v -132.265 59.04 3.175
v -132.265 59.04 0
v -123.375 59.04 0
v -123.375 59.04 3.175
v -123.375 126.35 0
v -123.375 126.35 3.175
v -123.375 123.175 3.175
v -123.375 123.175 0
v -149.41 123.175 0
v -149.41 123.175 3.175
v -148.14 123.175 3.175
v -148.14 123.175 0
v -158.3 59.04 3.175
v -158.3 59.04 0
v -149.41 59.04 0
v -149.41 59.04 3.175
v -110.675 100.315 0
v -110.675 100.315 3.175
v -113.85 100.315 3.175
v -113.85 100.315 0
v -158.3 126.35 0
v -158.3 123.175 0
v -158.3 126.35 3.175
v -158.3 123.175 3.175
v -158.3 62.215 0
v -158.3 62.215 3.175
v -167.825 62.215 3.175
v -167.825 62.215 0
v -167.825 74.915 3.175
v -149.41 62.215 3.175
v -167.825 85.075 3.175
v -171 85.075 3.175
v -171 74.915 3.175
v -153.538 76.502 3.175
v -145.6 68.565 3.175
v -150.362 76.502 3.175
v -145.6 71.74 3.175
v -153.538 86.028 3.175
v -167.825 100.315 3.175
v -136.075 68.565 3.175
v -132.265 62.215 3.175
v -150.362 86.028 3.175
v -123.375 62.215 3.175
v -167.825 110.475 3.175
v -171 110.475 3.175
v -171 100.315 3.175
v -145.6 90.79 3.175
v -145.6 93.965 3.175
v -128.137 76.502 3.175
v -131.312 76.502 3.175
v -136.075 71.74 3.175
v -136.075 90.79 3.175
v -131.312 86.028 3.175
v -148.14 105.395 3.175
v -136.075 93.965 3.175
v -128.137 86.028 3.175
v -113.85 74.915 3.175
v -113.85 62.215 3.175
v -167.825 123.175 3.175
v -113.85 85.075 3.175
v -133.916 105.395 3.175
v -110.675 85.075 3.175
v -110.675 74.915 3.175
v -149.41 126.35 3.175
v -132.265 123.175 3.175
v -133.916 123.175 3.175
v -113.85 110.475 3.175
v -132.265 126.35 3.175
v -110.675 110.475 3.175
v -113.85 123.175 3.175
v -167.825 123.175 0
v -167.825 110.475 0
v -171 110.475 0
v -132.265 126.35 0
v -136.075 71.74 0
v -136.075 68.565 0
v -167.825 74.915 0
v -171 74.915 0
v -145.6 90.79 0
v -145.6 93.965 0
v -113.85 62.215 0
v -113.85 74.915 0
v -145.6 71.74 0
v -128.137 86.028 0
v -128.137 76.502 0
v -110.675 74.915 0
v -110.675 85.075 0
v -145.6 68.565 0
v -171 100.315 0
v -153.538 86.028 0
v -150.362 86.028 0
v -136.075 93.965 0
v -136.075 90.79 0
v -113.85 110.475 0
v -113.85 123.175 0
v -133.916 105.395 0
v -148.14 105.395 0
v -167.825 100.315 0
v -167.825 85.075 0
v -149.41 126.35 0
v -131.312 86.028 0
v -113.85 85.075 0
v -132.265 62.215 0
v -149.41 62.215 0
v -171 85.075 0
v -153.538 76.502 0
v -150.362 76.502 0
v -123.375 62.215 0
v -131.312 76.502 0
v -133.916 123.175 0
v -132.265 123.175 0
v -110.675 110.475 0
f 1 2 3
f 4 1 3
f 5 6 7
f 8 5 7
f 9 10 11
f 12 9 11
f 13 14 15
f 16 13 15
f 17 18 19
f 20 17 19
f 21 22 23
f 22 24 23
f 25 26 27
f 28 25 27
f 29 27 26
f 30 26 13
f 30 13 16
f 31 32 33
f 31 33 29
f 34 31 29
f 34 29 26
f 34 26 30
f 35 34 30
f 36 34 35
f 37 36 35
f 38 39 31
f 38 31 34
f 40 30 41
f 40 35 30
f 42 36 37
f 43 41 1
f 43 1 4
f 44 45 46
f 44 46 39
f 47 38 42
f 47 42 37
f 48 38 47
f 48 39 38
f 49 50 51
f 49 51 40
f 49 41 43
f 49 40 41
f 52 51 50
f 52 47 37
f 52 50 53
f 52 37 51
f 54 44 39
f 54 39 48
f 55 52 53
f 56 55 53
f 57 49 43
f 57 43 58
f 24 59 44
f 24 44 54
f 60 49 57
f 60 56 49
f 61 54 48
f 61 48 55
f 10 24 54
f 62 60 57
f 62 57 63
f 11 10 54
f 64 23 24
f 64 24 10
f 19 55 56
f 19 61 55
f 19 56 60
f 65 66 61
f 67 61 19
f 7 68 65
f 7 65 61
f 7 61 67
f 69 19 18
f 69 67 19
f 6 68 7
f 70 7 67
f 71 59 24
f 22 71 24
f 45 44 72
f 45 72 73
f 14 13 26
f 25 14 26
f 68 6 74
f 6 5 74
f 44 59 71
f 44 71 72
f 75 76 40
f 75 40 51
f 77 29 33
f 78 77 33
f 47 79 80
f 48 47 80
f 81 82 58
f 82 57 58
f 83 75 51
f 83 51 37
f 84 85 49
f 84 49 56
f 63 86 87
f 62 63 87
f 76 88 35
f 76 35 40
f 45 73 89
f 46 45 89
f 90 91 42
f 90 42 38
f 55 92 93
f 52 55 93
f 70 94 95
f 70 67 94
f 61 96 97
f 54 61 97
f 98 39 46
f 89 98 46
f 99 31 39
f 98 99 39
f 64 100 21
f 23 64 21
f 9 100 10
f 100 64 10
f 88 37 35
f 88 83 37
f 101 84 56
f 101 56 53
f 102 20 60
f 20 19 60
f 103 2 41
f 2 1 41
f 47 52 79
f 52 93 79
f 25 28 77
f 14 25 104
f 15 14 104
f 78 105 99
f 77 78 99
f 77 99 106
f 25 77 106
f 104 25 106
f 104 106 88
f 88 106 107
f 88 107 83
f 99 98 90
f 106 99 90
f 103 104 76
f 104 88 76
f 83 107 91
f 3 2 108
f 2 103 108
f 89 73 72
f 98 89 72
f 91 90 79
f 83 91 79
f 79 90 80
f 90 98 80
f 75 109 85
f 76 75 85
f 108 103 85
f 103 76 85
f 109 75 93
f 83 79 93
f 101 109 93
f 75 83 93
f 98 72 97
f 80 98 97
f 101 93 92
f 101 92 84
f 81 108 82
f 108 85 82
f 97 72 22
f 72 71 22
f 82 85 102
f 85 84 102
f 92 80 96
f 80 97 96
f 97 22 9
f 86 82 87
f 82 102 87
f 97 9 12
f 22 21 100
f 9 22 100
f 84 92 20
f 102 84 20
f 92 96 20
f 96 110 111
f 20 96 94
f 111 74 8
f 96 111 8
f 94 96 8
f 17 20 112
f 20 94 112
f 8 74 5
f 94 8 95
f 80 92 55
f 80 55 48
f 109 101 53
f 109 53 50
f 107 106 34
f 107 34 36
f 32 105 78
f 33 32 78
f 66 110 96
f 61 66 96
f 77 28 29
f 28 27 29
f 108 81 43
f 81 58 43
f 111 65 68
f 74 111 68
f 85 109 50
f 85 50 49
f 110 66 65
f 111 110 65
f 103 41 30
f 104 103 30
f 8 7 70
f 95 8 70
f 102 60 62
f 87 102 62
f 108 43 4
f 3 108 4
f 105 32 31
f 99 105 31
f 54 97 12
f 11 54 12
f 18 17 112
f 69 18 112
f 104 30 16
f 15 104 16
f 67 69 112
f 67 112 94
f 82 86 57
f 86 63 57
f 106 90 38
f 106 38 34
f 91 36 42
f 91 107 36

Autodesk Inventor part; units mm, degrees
ref_plane "YZ Plane" through (0, 0, 0) normal (1, 0, 0) x (0, 1, 0)
ref_plane "XZ Plane" through (0, 0, 0) normal (0, 1, 0) x (-1, 0, 0)
ref_plane "XY Plane" through (0, 0, 0) normal (0, 0, 1) x (1, 0, 0)
sketch "Sketch1" plane through (0, 0, 0) normal (0, 0, 1) x (1, 0, 0)
  line L0 (-110.675, 126.35) -> (-171, 126.35)
  line L1 (-171, 126.35) -> (-171, 59.04)
  line L2 (-171, 59.04) -> (-110.675, 59.04)
  line L3 (-110.675, 59.04) -> (-110.675, 126.35)
  point P0 (0, 0)
  dimension "d0" = 60.325
  dimension "d1" = 67.31
extrude "Extrusion1" add sketch "Sketch1" along normal blind 3.175
sketch "Sketch2" plane through (0, 0, 3.175) normal (0, 0, 1) x (1, 0, 0)
  line L0 (-171, 126.35) -> (-171, 59.04) projected
  line L1 (-171, 59.04) -> (-167.825, 59.04)
  line L2 (-167.825, 59.04) -> (-167.825, 74.915)
  line L3 (-167.825, 74.915) -> (-171, 74.915)
  line L4 (-171, 74.915) -> (-171, 59.04)
  line L5 (-171, 85.075) -> (-167.825, 85.075)
  line L6 (-167.825, 85.075) -> (-167.825, 100.315)
  line L7 (-167.825, 100.315) -> (-171, 100.315)
  line L8 (-171, 100.315) -> (-171, 85.075)
  line L9 (-110.675, 126.35) -> (-171, 126.35) projected
  line L10 (-171, 126.35) -> (-167.825, 126.35)
  line L11 (-167.825, 126.35) -> (-167.825, 110.475)
  line L12 (-167.825, 110.475) -> (-171, 110.475)
  line L13 (-171, 110.475) -> (-171, 126.35)
  point P0 (0, 0)
  dimension "d4" = 3.175
  dimension "d5" = 15.875
  dimension "d6" = 10.16
  dimension "d7" = 15.875
  dimension "d8" = 10.16
extrude "Extrusion3" cut sketch "Sketch2" against normal blind 3.175
ref_plane "Work Plane1" through (-140.8375, 59.04, 0) normal (1, 0, 0) x (0, 0, -1)
mirror "Mirror1" about plane through (-140.8375, 59.04, 0) normal (1, 0, 0) of "Extrusion3"
sketch "Sketch3" plane through (0, 0, 3.175) normal (0, 0, 1) x (1, 0, 0)
  line L0 (-123.375, 59.04) -> (-110.675, 59.04)
  line L1 (-110.675, 59.04) -> (-110.675, 62.215)
  line L2 (-110.675, 62.215) -> (-123.375, 62.215)
  line L3 (-123.375, 62.215) -> (-123.375, 59.04)
  line L4 (-167.825, 59.04) -> (-113.85, 59.04) projected
  line L5 (-110.675, 74.915) -> (-110.675, 85.075) projected
  line L6 (-140.8375, 59.04) -> (-132.265, 59.04)
  line L7 (-132.265, 59.04) -> (-132.265, 62.215)
  line L8 (-132.265, 62.215) -> (-140.8375, 62.215)
  line L9 (-140.8375, 62.215) -> (-140.8375, 59.04)
  point P0 (0, 0)
  dimension "d13" = 12.7
  dimension "d14" = 3.175
  dimension "d15" = 8.89
extrude "Extrusion4" cut sketch "Sketch3" against normal blind 3.175
mirror "Mirror2" about plane through (-140.8375, 59.04, 0) normal (1, 0, 0) of "Extrusion4"
ref_plane "Work Plane2" through (-158.3, 92.695, 0) normal (0, -1, 0) x (1, 0, 0)
mirror "Mirror3" about plane through (-158.3, 92.695, 0) normal (0, -1, 0) of "Extrusion4", "Mirror2"
sketch "Sketch4" plane through (0, 0, 0) normal (0, 0, -1) x (-1, 0, 0)
  line L0 (149.41, 123.175) -> (132.265, 123.175) projected
  line L1 (148.14, 123.175) -> (133.916, 123.175)
  line L2 (133.916, 123.175) -> (133.916, 105.395)
  line L3 (133.916, 105.395) -> (148.14, 105.395)
  line L4 (148.14, 105.395) -> (148.14, 123.175)
  line L5 (110.675, 100.315) -> (110.675, 110.475) projected
  line L6 (171, 110.475) -> (171, 100.315) projected
  point P0 (0, 0)
  dimension "d18" = 17.78
  dimension "d19" = 14.224
  dimension "d21" = 22.86
extrude "Extrusion5" cut sketch "Sketch4" against normal blind 3.175
sketch "Sketch5" plane through (0, 0, 0) normal (0, 0, -1) x (-1, 0, 0)
  line L0 (153.5375, 68.565) -> (128.1375, 68.565)
  line L1 (128.1375, 68.565) -> (128.1375, 93.965)
  line L2 (128.1375, 93.965) -> (153.5375, 93.965)
  line L3 (153.5375, 93.965) -> (153.5375, 68.565)
  line L4 (140.8375, -25.27) -> (140.8375, 151.62) projected
  line L5 (132.265, 62.215) -> (149.41, 62.215) projected
  line L6 (145.6, 68.565) -> (136.075, 68.565)
  line L7 (136.075, 68.565) -> (136.075, 71.74)
  line L8 (136.075, 71.74) -> (145.6, 71.74)
  line L9 (145.6, 71.74) -> (145.6, 68.565)
  line L10 (145.6, 93.965) -> (136.075, 93.965)
  line L11 (136.075, 93.965) -> (136.075, 90.79)
  line L12 (136.075, 90.79) -> (145.6, 90.79)
  line L13 (145.6, 90.79) -> (145.6, 93.965)
  line L14 (153.5375, 76.5025) -> (150.3625, 76.5025)
  line L15 (150.3625, 76.5025) -> (150.3625, 86.0275)
  line L16 (150.3625, 86.0275) -> (153.5375, 86.0275)
  line L17 (153.5375, 86.0275) -> (153.5375, 76.5025)
  line L18 (128.1375, 86.0275) -> (131.3125, 86.0275)
  line L19 (131.3125, 86.0275) -> (131.3125, 76.5025)
  line L20 (131.3125, 76.5025) -> (128.1375, 76.5025)
  line L21 (128.1375, 76.5025) -> (128.1375, 86.0275)
  point P0 (0, 0)
  dimension "d24" = 25.4
  dimension "d25" = 25.4
  dimension "d26" = 12.7
  dimension "d27" = 6.35
  dimension "d28" = 3.175
  dimension "d29" = 7.9375
  dimension "d30" = 7.9375
  dimension "d31" = 3.175
  dimension "d32" = 7.9375
  dimension "d33" = 3.175
  dimension "d34" = 7.9375
  dimension "d35" = 3.175
extrude "Extrusion6" cut sketch "Sketch5" against normal blind 3.175 contours L0 L4 L8 L9 | L14 L15 L16 L3 | L0 L7 L8 L4 | L12 L11 L2 L4 | L4 L2 L13 L12 | L1 L18 L19 L20
